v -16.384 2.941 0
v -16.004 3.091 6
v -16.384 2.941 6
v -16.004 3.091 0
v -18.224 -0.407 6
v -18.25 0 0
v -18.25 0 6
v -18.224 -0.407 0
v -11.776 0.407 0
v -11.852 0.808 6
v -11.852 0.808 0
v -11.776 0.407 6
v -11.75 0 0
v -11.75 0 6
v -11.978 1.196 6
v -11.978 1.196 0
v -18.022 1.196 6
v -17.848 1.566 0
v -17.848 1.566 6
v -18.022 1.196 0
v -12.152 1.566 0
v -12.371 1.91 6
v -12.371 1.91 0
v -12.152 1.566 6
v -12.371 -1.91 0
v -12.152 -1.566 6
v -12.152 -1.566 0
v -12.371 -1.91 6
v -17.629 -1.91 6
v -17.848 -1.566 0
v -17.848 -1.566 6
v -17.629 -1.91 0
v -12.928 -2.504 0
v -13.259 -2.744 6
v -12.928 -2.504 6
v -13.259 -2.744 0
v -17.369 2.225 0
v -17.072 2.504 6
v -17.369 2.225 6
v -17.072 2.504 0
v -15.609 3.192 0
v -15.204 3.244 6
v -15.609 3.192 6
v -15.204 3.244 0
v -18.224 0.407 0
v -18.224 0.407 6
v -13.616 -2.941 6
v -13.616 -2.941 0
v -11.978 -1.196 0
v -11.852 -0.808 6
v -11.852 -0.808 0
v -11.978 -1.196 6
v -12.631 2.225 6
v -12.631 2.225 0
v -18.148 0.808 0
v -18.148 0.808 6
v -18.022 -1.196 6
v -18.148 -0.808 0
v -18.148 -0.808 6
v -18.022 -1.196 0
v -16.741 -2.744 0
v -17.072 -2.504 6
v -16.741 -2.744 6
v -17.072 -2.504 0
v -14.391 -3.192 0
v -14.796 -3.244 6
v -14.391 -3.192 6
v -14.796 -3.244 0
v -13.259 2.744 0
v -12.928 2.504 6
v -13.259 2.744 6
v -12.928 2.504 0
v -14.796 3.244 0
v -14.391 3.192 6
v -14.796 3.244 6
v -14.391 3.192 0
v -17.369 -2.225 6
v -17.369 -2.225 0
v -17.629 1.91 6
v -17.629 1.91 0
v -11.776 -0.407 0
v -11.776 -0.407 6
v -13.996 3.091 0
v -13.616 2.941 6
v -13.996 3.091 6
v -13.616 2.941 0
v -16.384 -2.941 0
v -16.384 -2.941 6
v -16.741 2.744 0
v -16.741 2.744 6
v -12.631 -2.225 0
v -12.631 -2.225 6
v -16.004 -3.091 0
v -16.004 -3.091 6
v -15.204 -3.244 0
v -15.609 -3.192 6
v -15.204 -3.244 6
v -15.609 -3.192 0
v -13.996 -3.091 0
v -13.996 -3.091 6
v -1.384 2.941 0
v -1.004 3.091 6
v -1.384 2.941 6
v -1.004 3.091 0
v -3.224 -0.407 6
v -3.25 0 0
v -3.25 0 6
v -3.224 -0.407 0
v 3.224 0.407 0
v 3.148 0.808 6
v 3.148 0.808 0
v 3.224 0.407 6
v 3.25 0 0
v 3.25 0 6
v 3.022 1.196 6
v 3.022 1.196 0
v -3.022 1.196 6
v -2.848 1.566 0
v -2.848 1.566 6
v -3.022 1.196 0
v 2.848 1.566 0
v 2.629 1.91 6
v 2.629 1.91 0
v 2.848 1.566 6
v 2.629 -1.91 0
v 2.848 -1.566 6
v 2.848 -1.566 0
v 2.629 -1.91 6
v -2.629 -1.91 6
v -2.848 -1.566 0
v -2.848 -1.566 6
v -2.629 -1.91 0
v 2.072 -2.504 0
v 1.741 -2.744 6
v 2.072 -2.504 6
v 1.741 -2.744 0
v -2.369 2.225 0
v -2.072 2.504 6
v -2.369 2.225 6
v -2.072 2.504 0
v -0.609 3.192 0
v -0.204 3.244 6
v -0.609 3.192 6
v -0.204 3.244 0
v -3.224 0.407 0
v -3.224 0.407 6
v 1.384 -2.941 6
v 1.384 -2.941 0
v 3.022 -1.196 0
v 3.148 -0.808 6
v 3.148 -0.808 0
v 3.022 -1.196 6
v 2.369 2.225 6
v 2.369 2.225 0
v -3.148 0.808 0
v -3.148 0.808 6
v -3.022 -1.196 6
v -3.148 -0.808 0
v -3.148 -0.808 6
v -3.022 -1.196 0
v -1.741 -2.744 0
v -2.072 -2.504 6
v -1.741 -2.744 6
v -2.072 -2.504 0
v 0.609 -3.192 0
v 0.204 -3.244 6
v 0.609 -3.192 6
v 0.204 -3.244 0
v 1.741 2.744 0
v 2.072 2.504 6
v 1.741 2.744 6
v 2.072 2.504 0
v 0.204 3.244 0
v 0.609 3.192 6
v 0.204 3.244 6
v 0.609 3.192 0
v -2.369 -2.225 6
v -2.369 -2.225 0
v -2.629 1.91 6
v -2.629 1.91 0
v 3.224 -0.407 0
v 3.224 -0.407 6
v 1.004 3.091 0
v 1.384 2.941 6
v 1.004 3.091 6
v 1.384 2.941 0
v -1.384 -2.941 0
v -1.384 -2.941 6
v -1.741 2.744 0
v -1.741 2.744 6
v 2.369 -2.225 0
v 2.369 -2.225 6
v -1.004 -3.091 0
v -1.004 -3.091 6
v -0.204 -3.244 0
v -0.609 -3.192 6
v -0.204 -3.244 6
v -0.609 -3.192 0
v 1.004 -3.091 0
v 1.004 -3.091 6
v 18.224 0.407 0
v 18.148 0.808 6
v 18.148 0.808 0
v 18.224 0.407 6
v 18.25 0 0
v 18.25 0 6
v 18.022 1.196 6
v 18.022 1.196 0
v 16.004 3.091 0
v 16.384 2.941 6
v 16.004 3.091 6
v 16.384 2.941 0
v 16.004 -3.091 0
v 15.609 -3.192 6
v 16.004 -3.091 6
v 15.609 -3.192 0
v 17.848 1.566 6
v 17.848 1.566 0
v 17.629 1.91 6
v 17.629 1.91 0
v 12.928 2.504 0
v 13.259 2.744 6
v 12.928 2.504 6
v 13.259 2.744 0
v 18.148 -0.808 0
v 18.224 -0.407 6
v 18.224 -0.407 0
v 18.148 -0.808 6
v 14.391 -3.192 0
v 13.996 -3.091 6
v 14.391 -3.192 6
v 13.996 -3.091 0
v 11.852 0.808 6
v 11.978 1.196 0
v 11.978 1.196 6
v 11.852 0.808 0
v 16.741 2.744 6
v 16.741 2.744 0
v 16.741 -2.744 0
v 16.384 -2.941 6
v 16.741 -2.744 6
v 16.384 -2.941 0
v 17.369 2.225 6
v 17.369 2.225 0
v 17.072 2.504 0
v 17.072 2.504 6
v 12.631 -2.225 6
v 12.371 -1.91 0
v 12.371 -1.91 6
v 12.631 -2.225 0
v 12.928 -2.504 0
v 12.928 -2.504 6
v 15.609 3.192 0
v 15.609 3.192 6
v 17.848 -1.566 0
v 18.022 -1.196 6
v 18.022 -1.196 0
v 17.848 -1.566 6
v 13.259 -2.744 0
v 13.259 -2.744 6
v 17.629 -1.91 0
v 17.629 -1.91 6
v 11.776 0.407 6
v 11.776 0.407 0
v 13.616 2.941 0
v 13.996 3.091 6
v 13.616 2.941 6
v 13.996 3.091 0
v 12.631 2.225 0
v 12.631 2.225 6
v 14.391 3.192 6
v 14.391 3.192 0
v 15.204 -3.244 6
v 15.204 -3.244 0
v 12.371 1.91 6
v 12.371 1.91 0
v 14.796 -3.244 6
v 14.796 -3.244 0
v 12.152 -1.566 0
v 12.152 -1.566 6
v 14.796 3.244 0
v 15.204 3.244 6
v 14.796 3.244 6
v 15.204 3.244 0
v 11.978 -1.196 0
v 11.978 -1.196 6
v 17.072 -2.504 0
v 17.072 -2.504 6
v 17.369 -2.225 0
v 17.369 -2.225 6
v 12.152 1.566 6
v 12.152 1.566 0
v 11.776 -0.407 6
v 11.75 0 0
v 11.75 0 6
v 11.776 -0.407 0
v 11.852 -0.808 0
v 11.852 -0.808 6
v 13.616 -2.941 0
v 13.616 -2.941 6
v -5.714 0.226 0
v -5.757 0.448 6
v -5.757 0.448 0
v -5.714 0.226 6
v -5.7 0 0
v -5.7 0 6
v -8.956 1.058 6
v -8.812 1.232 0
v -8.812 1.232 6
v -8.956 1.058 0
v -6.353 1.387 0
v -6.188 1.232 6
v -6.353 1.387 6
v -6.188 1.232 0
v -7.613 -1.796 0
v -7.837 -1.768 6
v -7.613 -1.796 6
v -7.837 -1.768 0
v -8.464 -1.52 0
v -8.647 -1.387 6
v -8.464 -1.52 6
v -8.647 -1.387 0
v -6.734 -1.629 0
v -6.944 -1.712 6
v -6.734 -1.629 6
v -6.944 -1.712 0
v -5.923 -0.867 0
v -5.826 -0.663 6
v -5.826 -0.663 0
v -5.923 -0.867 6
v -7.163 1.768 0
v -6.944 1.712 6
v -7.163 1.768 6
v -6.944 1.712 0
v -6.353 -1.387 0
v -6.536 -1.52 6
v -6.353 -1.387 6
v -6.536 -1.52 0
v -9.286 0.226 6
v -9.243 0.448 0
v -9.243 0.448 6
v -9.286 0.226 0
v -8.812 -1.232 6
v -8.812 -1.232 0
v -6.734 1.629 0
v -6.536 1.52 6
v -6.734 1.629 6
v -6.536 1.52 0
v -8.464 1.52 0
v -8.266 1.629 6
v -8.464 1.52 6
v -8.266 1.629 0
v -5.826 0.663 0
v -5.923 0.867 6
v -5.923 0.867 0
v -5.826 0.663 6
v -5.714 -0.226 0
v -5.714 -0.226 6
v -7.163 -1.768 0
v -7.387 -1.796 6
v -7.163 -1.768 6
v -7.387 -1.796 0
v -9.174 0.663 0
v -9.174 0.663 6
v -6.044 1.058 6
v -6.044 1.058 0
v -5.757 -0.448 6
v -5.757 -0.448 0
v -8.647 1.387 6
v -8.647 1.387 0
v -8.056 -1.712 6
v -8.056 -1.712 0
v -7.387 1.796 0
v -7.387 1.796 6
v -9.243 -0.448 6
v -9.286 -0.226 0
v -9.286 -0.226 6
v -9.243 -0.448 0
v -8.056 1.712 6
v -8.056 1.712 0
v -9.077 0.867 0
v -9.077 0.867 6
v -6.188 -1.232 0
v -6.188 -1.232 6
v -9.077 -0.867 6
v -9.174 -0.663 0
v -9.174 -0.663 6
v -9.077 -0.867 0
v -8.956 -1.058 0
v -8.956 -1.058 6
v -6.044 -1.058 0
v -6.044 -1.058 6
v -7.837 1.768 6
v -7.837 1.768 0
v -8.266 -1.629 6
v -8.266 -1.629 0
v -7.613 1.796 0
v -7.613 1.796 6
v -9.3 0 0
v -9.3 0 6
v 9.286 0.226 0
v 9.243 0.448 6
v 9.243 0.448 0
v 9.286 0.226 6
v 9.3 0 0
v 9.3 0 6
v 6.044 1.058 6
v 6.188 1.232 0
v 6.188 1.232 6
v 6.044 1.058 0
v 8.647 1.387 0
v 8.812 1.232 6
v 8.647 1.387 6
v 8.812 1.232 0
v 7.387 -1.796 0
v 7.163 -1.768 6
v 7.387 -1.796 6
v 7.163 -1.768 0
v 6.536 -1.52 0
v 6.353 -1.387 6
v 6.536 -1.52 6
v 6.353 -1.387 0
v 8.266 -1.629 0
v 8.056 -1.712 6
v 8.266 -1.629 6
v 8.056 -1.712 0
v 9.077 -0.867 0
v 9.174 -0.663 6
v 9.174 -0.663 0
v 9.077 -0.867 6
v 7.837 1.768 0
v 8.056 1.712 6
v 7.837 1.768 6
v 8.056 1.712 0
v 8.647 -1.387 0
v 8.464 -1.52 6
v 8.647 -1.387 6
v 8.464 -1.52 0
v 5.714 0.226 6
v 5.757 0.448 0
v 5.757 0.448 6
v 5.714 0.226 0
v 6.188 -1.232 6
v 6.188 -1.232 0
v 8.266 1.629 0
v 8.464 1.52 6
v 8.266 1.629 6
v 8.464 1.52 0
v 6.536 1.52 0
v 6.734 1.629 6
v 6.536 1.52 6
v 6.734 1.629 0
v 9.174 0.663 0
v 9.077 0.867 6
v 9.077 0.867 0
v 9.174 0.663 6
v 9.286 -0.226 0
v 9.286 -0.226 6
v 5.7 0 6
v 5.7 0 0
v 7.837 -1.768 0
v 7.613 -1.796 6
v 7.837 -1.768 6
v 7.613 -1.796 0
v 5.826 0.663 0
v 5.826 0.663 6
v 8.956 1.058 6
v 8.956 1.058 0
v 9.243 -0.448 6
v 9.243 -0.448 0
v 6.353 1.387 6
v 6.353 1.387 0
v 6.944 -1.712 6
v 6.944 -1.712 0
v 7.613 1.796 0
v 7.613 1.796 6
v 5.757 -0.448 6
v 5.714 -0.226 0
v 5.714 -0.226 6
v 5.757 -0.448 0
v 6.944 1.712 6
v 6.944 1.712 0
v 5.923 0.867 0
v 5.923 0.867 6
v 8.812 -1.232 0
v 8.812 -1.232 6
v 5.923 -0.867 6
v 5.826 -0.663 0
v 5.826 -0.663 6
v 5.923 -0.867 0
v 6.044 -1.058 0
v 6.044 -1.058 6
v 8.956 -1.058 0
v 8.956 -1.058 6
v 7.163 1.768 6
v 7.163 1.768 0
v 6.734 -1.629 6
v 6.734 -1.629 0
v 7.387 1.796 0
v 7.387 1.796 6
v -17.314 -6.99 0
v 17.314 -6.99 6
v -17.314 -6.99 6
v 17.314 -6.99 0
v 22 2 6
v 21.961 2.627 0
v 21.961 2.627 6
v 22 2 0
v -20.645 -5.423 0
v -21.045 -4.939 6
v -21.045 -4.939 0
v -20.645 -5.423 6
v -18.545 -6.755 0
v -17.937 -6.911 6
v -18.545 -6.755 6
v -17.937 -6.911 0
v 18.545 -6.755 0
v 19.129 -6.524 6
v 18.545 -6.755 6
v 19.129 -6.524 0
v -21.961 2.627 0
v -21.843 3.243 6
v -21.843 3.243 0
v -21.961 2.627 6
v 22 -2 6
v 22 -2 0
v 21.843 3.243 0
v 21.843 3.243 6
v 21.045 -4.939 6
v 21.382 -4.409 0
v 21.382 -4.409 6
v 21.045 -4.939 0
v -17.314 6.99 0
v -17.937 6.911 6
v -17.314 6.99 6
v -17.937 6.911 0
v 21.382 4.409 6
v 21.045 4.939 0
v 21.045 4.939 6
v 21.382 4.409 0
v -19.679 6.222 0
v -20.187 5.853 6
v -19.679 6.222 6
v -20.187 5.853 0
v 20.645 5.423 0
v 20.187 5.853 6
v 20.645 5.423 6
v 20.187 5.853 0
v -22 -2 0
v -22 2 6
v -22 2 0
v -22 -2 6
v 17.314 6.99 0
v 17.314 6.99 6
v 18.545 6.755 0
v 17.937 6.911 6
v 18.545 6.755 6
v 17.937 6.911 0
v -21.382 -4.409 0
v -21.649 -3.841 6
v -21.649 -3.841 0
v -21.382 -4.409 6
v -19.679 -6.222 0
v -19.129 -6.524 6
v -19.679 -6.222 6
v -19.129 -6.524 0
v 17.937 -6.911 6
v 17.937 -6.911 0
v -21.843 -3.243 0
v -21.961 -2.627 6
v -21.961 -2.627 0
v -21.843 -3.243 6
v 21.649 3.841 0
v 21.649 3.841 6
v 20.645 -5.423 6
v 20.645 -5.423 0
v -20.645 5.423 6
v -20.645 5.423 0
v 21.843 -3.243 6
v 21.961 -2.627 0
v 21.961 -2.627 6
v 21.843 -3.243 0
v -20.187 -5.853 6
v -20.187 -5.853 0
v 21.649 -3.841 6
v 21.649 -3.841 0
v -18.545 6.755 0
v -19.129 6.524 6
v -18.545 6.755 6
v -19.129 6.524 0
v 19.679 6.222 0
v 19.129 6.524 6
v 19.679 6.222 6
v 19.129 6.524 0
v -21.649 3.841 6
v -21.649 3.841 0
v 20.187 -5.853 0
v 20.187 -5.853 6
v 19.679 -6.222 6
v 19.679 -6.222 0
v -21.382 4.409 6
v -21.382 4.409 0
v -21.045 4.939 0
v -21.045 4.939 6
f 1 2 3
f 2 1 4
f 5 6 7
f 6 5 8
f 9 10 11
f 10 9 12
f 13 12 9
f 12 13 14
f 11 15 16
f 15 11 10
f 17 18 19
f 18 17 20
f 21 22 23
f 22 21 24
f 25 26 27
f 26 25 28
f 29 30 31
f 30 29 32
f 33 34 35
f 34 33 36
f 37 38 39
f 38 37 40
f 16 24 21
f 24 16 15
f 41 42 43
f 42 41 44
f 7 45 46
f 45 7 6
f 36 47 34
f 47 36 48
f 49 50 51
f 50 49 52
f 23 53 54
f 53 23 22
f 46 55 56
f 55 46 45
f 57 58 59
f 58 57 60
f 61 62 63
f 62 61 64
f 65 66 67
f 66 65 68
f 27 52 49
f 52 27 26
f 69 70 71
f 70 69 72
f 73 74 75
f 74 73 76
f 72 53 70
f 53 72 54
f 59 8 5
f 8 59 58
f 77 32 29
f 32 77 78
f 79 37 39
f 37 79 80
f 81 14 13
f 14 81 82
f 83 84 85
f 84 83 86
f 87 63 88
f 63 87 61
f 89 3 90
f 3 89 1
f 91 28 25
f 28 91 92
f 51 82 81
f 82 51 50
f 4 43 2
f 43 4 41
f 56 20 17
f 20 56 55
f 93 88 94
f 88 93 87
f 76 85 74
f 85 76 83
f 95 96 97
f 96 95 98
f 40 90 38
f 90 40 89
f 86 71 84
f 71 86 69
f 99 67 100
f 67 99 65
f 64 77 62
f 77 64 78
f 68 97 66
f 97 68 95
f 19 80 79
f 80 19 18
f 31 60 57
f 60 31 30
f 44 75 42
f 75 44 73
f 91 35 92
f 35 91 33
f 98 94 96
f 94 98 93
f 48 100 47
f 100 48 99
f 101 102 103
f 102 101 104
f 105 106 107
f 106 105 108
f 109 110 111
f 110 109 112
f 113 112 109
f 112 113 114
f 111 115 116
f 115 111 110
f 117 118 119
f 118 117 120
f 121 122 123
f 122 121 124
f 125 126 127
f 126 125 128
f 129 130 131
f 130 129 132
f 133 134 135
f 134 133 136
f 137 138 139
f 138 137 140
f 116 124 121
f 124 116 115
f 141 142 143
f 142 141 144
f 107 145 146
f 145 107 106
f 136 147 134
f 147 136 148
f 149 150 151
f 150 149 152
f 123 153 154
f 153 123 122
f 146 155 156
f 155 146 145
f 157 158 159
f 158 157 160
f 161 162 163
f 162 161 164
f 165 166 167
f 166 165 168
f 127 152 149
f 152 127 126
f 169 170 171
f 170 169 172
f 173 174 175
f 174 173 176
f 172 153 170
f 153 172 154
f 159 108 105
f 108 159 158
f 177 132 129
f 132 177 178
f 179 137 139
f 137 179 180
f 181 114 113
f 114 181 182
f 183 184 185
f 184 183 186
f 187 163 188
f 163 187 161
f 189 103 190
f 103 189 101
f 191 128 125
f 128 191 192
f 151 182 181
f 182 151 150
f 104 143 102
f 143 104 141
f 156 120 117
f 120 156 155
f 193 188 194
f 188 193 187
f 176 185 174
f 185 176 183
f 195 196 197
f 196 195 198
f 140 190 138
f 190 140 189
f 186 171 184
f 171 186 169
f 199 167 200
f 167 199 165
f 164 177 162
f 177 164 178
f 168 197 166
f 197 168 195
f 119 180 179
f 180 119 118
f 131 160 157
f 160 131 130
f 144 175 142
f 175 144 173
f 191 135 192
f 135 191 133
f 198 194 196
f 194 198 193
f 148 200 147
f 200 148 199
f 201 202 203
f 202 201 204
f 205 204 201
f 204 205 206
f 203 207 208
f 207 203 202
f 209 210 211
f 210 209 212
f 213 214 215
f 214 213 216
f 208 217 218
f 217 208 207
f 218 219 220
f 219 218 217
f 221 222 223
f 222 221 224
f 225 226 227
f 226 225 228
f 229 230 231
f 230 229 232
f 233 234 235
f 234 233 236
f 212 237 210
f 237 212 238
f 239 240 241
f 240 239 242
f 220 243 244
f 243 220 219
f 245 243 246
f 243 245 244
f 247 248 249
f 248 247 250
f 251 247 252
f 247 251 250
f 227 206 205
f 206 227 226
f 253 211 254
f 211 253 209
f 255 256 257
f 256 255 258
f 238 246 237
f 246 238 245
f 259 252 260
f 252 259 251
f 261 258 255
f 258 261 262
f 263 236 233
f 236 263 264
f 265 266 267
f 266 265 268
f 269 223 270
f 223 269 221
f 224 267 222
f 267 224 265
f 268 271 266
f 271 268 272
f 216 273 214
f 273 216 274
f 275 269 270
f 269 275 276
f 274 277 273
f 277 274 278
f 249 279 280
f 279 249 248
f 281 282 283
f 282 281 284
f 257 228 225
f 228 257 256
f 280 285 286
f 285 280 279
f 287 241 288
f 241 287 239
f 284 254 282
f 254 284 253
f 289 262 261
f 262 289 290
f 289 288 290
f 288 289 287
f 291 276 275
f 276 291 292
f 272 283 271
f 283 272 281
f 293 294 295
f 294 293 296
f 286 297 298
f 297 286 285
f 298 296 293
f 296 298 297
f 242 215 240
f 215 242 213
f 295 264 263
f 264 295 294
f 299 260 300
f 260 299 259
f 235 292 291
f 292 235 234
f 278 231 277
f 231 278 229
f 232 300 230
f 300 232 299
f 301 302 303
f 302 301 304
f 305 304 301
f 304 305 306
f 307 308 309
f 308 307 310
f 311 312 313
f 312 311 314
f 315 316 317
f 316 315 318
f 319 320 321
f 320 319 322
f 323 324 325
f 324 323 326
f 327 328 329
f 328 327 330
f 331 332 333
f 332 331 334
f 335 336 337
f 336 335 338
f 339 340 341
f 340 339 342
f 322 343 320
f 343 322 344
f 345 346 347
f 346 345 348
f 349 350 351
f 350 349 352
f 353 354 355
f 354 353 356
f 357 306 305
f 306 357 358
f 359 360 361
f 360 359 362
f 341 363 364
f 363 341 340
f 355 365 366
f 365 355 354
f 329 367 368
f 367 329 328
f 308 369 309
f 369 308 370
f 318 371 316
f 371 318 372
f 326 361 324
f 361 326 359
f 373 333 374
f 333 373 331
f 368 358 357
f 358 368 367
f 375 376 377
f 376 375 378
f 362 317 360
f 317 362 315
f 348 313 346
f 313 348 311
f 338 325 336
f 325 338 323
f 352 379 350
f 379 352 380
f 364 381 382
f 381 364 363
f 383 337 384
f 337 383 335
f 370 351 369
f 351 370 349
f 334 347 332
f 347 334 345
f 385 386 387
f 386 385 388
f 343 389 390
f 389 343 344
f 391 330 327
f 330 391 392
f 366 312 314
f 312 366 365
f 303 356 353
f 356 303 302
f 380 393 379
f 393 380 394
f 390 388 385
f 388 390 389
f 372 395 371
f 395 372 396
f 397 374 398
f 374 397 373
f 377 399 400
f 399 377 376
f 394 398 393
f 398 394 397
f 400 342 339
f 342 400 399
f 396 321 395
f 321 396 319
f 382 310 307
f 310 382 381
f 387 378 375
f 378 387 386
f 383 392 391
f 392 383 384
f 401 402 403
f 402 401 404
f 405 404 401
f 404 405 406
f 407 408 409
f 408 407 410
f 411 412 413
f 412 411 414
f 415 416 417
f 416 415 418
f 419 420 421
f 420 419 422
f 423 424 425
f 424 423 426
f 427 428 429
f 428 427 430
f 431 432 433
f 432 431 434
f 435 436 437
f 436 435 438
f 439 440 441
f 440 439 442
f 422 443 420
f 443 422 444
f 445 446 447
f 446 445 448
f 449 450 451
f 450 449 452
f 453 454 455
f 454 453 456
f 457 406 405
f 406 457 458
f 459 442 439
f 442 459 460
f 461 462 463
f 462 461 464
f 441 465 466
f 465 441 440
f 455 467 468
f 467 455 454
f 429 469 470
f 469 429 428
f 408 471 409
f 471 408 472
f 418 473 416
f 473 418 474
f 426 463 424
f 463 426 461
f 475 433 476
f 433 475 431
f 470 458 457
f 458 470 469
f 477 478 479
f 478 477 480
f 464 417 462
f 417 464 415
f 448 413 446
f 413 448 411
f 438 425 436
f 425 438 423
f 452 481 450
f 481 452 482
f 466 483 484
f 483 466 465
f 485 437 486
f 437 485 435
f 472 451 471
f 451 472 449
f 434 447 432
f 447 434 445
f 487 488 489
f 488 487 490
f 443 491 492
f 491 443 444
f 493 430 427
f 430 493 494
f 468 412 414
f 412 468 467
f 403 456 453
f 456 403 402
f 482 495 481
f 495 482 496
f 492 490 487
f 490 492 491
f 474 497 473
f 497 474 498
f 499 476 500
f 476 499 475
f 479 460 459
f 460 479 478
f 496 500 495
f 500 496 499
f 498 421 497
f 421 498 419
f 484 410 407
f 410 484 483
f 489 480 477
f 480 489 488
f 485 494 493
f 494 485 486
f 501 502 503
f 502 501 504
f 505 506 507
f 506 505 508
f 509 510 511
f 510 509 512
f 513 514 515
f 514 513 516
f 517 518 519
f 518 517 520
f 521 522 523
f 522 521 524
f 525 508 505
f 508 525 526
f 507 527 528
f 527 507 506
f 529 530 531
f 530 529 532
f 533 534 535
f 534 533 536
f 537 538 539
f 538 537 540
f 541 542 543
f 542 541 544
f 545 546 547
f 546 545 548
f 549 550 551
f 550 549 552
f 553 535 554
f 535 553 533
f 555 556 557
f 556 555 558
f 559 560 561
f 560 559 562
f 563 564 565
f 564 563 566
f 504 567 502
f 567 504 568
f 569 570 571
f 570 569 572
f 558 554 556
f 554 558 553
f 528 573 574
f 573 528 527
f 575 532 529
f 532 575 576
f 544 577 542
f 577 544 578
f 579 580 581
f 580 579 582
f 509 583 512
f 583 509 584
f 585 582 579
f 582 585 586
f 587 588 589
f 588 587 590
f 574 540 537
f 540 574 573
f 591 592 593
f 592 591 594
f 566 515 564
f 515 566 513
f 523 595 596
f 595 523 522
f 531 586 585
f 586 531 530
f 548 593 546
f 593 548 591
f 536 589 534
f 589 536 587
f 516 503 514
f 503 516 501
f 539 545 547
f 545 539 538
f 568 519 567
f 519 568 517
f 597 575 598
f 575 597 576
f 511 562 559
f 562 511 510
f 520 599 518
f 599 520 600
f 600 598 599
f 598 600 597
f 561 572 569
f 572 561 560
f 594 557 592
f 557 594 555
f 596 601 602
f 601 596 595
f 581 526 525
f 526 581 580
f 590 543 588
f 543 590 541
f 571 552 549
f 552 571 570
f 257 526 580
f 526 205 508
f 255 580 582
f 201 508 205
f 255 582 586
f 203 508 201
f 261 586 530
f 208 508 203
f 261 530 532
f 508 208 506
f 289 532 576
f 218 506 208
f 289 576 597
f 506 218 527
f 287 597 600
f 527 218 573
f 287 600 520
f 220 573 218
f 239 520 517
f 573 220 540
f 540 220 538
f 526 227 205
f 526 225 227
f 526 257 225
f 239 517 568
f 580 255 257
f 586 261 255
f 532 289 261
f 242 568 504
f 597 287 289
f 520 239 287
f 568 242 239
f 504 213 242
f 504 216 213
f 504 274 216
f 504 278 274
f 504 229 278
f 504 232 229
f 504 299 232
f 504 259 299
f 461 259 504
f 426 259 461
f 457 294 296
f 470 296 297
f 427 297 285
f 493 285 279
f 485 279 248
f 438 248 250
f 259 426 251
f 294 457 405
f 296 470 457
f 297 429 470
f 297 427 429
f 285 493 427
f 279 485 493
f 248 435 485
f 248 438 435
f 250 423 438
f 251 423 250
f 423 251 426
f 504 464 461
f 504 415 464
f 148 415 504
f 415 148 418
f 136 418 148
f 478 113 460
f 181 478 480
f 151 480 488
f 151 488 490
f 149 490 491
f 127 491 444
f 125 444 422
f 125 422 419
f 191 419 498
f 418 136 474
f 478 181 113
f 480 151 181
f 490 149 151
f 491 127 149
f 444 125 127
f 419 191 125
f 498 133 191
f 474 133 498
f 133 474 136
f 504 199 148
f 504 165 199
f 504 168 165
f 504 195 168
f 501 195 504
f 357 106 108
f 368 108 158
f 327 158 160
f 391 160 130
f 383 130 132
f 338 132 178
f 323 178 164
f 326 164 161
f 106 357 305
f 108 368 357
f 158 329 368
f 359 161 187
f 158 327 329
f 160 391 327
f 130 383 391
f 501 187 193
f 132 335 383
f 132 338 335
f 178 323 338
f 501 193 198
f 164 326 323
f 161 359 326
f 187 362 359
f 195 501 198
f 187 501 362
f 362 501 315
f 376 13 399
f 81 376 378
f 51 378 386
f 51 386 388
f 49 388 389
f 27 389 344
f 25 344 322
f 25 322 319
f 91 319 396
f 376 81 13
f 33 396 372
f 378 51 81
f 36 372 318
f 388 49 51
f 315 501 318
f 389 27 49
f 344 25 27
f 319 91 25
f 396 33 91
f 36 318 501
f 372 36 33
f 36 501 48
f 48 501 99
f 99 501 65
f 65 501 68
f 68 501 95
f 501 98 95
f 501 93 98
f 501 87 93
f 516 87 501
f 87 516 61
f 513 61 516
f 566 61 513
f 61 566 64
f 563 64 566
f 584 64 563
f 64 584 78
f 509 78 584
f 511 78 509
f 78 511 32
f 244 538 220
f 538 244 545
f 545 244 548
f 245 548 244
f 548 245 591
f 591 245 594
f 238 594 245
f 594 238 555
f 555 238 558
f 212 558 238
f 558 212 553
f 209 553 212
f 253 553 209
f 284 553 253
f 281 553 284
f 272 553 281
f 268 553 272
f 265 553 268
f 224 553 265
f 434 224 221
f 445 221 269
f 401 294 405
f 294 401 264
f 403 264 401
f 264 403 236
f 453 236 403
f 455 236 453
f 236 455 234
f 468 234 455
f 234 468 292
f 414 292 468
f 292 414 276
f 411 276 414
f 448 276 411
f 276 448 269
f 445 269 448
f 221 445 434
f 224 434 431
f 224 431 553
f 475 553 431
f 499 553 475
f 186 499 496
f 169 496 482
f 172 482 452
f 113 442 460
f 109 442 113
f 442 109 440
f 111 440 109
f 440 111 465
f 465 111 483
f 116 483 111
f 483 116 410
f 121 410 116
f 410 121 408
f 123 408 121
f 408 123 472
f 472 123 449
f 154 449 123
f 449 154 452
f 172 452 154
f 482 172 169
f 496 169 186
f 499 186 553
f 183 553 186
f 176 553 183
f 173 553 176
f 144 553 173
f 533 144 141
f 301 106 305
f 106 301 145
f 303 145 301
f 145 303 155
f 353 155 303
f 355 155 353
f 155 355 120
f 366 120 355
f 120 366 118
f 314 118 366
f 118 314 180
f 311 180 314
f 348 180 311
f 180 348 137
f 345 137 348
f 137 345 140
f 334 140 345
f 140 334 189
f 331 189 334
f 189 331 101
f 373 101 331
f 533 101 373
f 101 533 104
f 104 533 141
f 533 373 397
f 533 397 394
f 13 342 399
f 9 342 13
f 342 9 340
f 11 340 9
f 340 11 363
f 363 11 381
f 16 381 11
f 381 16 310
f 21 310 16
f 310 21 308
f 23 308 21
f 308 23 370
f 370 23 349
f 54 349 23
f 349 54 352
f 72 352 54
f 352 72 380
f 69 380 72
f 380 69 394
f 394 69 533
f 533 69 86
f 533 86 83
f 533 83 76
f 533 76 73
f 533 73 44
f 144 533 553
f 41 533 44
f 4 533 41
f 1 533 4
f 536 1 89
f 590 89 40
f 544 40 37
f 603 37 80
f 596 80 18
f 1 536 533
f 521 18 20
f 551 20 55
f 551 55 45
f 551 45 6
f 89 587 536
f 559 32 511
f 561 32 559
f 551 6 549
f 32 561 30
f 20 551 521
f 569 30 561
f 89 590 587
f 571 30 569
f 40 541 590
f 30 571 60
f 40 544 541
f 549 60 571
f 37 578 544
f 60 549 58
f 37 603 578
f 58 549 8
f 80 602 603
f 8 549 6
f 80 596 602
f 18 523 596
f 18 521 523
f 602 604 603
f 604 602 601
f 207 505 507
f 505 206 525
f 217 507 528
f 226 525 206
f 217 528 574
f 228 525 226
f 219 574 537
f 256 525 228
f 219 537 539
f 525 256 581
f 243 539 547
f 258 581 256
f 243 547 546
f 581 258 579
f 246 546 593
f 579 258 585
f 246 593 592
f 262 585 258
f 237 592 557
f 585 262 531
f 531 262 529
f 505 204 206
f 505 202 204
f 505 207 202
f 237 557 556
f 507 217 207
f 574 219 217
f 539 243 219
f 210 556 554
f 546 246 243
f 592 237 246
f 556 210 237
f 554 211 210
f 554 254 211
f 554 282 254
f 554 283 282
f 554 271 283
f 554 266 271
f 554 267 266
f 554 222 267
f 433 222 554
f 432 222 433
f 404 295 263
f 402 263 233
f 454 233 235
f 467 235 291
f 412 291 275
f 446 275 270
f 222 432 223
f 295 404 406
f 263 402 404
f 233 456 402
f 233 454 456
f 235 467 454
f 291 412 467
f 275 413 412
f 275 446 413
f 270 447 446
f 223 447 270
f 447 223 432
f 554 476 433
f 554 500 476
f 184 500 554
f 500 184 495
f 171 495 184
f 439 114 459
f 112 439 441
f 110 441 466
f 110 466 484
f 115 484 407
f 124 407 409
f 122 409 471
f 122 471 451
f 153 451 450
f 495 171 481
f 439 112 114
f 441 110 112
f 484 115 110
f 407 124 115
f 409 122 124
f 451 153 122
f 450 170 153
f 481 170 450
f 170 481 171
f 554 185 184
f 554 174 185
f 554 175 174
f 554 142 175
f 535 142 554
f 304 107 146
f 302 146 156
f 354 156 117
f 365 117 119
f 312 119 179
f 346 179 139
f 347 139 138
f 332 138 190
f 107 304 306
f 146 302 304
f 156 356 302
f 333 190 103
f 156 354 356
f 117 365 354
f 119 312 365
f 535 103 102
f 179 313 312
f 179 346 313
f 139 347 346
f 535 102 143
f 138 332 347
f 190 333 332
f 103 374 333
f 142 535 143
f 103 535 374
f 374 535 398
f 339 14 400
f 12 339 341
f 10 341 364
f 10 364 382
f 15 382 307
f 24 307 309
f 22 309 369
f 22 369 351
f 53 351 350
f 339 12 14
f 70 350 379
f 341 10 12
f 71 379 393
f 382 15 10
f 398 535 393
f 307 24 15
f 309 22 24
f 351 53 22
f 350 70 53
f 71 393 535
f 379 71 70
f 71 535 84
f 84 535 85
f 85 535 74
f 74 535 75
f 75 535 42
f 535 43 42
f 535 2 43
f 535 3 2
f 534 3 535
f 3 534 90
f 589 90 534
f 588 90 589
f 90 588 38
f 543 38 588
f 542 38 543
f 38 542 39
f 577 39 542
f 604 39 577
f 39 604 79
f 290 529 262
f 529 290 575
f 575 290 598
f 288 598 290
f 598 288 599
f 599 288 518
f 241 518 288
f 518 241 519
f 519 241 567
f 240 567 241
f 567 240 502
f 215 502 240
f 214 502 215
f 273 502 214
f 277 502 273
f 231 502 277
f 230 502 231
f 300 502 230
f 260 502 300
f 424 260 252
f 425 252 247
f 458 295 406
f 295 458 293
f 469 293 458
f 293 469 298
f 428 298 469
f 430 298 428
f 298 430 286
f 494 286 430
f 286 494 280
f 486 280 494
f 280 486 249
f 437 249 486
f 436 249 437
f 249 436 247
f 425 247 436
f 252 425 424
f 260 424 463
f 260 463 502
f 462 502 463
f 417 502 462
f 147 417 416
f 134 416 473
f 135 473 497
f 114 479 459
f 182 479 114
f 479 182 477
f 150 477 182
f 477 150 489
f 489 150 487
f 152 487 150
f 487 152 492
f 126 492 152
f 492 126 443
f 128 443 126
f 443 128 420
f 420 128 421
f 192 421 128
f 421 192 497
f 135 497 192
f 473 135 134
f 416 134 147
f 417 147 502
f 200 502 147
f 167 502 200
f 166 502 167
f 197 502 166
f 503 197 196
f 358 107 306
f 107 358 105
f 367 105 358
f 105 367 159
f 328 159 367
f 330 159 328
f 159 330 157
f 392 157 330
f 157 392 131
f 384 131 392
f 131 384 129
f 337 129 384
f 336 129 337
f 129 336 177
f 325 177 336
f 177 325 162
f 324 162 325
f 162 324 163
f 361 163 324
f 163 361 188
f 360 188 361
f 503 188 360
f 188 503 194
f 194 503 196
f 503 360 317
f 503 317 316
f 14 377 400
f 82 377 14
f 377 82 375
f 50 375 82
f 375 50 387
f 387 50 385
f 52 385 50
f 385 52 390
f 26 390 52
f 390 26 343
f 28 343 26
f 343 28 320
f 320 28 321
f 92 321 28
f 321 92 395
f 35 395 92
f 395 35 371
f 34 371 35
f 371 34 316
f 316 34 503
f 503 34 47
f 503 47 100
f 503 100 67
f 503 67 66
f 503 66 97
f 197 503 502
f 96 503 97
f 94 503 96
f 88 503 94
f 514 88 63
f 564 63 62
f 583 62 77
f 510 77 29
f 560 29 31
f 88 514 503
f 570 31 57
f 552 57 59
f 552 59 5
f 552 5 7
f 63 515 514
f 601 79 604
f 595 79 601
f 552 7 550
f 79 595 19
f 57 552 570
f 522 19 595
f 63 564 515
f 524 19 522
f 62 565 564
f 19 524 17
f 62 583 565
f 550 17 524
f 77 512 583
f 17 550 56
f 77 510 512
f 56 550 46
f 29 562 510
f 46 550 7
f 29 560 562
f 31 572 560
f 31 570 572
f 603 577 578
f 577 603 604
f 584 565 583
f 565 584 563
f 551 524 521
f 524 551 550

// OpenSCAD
$fn = 50;


difference() {
	union() {
		*color(alpha = 1.0000000000, c = "gray") {
			translate(v = [0, 7, 0]) {
				linear_extrude(height = 1) {
					text(font = "Arial:style=Bold", halign = "center", size = 4.5000000000, text = "COMMENT plate main", valign = "center");
				}
			}
		}
		*color(alpha = 1.0000000000, c = "gray") {
			translate(v = [0, 14, 0]) {
				linear_extrude(height = 1) {
					text(font = "Arial:style=Bold", halign = "center", size = 4.5000000000, text = "COMMENT description oobb_plate_shape_p_type_6_depth_3_width_1_height_6_thickness_true_both_holes", valign = "center");
				}
			}
		}
		hull() {
			translate(v = [-17.0000000000, 2.0000000000, 0]) {
				cylinder(h = 6, r = 5);
			}
			translate(v = [17.0000000000, 2.0000000000, 0]) {
				cylinder(h = 6, r = 5);
			}
			translate(v = [-17.0000000000, -2.0000000000, 0]) {
				cylinder(h = 6, r = 5);
			}
			translate(v = [17.0000000000, -2.0000000000, 0]) {
				cylinder(h = 6, r = 5);
			}
		}
	}
	union() {
		*color(alpha = 1.0000000000, c = "gray") {
			translate(v = [0, 7, 0]) {
				linear_extrude(height = 1) {
					text(font = "Arial:style=Bold", halign = "center", size = 4.5000000000, text = "COMMENT holes main", valign = "center");
				}
			}
		}
		*color(alpha = 1.0000000000, c = "gray") {
			translate(v = [0, 14, 0]) {
				linear_extrude(height = 1) {
					text(font = "Arial:style=Bold", halign = "center", size = 4.5000000000, text = "COMMENT description oobb_holes_shape_n_type_3_width_1_height_6_thickness_true_both_holes", valign = "center");
				}
			}
		}
		translate(v = [-15.0000000000, 0.0000000000, 0]) {
			translate(v = [0, 0, -50]) {
				cylinder(h = 100, r = 3.2500000000);
			}
		}
		translate(v = [0, 0, -50]) {
			cylinder(h = 100, r = 3.2500000000);
		}
		translate(v = [15.0000000000, 0.0000000000, 0]) {
			translate(v = [0, 0, -50]) {
				cylinder(h = 100, r = 3.2500000000);
			}
		}
		translate(v = [-15.0000000000, 0.0000000000, 0]) {
			translate(v = [0, 0, -50]) {
				cylinder(h = 100, r = 1.8000000000);
			}
		}
		translate(v = [-7.5000000000, 0.0000000000, 0]) {
			translate(v = [0, 0, -50]) {
				cylinder(h = 100, r = 1.8000000000);
			}
		}
		translate(v = [0, 0, -50]) {
			cylinder(h = 100, r = 1.8000000000);
		}
		translate(v = [7.5000000000, 0.0000000000, 0]) {
			translate(v = [0, 0, -50]) {
				cylinder(h = 100, r = 1.8000000000);
			}
		}
		translate(v = [15.0000000000, 0.0000000000, 0]) {
			translate(v = [0, 0, -50]) {
				cylinder(h = 100, r = 1.8000000000);
			}
		}
	}
}
